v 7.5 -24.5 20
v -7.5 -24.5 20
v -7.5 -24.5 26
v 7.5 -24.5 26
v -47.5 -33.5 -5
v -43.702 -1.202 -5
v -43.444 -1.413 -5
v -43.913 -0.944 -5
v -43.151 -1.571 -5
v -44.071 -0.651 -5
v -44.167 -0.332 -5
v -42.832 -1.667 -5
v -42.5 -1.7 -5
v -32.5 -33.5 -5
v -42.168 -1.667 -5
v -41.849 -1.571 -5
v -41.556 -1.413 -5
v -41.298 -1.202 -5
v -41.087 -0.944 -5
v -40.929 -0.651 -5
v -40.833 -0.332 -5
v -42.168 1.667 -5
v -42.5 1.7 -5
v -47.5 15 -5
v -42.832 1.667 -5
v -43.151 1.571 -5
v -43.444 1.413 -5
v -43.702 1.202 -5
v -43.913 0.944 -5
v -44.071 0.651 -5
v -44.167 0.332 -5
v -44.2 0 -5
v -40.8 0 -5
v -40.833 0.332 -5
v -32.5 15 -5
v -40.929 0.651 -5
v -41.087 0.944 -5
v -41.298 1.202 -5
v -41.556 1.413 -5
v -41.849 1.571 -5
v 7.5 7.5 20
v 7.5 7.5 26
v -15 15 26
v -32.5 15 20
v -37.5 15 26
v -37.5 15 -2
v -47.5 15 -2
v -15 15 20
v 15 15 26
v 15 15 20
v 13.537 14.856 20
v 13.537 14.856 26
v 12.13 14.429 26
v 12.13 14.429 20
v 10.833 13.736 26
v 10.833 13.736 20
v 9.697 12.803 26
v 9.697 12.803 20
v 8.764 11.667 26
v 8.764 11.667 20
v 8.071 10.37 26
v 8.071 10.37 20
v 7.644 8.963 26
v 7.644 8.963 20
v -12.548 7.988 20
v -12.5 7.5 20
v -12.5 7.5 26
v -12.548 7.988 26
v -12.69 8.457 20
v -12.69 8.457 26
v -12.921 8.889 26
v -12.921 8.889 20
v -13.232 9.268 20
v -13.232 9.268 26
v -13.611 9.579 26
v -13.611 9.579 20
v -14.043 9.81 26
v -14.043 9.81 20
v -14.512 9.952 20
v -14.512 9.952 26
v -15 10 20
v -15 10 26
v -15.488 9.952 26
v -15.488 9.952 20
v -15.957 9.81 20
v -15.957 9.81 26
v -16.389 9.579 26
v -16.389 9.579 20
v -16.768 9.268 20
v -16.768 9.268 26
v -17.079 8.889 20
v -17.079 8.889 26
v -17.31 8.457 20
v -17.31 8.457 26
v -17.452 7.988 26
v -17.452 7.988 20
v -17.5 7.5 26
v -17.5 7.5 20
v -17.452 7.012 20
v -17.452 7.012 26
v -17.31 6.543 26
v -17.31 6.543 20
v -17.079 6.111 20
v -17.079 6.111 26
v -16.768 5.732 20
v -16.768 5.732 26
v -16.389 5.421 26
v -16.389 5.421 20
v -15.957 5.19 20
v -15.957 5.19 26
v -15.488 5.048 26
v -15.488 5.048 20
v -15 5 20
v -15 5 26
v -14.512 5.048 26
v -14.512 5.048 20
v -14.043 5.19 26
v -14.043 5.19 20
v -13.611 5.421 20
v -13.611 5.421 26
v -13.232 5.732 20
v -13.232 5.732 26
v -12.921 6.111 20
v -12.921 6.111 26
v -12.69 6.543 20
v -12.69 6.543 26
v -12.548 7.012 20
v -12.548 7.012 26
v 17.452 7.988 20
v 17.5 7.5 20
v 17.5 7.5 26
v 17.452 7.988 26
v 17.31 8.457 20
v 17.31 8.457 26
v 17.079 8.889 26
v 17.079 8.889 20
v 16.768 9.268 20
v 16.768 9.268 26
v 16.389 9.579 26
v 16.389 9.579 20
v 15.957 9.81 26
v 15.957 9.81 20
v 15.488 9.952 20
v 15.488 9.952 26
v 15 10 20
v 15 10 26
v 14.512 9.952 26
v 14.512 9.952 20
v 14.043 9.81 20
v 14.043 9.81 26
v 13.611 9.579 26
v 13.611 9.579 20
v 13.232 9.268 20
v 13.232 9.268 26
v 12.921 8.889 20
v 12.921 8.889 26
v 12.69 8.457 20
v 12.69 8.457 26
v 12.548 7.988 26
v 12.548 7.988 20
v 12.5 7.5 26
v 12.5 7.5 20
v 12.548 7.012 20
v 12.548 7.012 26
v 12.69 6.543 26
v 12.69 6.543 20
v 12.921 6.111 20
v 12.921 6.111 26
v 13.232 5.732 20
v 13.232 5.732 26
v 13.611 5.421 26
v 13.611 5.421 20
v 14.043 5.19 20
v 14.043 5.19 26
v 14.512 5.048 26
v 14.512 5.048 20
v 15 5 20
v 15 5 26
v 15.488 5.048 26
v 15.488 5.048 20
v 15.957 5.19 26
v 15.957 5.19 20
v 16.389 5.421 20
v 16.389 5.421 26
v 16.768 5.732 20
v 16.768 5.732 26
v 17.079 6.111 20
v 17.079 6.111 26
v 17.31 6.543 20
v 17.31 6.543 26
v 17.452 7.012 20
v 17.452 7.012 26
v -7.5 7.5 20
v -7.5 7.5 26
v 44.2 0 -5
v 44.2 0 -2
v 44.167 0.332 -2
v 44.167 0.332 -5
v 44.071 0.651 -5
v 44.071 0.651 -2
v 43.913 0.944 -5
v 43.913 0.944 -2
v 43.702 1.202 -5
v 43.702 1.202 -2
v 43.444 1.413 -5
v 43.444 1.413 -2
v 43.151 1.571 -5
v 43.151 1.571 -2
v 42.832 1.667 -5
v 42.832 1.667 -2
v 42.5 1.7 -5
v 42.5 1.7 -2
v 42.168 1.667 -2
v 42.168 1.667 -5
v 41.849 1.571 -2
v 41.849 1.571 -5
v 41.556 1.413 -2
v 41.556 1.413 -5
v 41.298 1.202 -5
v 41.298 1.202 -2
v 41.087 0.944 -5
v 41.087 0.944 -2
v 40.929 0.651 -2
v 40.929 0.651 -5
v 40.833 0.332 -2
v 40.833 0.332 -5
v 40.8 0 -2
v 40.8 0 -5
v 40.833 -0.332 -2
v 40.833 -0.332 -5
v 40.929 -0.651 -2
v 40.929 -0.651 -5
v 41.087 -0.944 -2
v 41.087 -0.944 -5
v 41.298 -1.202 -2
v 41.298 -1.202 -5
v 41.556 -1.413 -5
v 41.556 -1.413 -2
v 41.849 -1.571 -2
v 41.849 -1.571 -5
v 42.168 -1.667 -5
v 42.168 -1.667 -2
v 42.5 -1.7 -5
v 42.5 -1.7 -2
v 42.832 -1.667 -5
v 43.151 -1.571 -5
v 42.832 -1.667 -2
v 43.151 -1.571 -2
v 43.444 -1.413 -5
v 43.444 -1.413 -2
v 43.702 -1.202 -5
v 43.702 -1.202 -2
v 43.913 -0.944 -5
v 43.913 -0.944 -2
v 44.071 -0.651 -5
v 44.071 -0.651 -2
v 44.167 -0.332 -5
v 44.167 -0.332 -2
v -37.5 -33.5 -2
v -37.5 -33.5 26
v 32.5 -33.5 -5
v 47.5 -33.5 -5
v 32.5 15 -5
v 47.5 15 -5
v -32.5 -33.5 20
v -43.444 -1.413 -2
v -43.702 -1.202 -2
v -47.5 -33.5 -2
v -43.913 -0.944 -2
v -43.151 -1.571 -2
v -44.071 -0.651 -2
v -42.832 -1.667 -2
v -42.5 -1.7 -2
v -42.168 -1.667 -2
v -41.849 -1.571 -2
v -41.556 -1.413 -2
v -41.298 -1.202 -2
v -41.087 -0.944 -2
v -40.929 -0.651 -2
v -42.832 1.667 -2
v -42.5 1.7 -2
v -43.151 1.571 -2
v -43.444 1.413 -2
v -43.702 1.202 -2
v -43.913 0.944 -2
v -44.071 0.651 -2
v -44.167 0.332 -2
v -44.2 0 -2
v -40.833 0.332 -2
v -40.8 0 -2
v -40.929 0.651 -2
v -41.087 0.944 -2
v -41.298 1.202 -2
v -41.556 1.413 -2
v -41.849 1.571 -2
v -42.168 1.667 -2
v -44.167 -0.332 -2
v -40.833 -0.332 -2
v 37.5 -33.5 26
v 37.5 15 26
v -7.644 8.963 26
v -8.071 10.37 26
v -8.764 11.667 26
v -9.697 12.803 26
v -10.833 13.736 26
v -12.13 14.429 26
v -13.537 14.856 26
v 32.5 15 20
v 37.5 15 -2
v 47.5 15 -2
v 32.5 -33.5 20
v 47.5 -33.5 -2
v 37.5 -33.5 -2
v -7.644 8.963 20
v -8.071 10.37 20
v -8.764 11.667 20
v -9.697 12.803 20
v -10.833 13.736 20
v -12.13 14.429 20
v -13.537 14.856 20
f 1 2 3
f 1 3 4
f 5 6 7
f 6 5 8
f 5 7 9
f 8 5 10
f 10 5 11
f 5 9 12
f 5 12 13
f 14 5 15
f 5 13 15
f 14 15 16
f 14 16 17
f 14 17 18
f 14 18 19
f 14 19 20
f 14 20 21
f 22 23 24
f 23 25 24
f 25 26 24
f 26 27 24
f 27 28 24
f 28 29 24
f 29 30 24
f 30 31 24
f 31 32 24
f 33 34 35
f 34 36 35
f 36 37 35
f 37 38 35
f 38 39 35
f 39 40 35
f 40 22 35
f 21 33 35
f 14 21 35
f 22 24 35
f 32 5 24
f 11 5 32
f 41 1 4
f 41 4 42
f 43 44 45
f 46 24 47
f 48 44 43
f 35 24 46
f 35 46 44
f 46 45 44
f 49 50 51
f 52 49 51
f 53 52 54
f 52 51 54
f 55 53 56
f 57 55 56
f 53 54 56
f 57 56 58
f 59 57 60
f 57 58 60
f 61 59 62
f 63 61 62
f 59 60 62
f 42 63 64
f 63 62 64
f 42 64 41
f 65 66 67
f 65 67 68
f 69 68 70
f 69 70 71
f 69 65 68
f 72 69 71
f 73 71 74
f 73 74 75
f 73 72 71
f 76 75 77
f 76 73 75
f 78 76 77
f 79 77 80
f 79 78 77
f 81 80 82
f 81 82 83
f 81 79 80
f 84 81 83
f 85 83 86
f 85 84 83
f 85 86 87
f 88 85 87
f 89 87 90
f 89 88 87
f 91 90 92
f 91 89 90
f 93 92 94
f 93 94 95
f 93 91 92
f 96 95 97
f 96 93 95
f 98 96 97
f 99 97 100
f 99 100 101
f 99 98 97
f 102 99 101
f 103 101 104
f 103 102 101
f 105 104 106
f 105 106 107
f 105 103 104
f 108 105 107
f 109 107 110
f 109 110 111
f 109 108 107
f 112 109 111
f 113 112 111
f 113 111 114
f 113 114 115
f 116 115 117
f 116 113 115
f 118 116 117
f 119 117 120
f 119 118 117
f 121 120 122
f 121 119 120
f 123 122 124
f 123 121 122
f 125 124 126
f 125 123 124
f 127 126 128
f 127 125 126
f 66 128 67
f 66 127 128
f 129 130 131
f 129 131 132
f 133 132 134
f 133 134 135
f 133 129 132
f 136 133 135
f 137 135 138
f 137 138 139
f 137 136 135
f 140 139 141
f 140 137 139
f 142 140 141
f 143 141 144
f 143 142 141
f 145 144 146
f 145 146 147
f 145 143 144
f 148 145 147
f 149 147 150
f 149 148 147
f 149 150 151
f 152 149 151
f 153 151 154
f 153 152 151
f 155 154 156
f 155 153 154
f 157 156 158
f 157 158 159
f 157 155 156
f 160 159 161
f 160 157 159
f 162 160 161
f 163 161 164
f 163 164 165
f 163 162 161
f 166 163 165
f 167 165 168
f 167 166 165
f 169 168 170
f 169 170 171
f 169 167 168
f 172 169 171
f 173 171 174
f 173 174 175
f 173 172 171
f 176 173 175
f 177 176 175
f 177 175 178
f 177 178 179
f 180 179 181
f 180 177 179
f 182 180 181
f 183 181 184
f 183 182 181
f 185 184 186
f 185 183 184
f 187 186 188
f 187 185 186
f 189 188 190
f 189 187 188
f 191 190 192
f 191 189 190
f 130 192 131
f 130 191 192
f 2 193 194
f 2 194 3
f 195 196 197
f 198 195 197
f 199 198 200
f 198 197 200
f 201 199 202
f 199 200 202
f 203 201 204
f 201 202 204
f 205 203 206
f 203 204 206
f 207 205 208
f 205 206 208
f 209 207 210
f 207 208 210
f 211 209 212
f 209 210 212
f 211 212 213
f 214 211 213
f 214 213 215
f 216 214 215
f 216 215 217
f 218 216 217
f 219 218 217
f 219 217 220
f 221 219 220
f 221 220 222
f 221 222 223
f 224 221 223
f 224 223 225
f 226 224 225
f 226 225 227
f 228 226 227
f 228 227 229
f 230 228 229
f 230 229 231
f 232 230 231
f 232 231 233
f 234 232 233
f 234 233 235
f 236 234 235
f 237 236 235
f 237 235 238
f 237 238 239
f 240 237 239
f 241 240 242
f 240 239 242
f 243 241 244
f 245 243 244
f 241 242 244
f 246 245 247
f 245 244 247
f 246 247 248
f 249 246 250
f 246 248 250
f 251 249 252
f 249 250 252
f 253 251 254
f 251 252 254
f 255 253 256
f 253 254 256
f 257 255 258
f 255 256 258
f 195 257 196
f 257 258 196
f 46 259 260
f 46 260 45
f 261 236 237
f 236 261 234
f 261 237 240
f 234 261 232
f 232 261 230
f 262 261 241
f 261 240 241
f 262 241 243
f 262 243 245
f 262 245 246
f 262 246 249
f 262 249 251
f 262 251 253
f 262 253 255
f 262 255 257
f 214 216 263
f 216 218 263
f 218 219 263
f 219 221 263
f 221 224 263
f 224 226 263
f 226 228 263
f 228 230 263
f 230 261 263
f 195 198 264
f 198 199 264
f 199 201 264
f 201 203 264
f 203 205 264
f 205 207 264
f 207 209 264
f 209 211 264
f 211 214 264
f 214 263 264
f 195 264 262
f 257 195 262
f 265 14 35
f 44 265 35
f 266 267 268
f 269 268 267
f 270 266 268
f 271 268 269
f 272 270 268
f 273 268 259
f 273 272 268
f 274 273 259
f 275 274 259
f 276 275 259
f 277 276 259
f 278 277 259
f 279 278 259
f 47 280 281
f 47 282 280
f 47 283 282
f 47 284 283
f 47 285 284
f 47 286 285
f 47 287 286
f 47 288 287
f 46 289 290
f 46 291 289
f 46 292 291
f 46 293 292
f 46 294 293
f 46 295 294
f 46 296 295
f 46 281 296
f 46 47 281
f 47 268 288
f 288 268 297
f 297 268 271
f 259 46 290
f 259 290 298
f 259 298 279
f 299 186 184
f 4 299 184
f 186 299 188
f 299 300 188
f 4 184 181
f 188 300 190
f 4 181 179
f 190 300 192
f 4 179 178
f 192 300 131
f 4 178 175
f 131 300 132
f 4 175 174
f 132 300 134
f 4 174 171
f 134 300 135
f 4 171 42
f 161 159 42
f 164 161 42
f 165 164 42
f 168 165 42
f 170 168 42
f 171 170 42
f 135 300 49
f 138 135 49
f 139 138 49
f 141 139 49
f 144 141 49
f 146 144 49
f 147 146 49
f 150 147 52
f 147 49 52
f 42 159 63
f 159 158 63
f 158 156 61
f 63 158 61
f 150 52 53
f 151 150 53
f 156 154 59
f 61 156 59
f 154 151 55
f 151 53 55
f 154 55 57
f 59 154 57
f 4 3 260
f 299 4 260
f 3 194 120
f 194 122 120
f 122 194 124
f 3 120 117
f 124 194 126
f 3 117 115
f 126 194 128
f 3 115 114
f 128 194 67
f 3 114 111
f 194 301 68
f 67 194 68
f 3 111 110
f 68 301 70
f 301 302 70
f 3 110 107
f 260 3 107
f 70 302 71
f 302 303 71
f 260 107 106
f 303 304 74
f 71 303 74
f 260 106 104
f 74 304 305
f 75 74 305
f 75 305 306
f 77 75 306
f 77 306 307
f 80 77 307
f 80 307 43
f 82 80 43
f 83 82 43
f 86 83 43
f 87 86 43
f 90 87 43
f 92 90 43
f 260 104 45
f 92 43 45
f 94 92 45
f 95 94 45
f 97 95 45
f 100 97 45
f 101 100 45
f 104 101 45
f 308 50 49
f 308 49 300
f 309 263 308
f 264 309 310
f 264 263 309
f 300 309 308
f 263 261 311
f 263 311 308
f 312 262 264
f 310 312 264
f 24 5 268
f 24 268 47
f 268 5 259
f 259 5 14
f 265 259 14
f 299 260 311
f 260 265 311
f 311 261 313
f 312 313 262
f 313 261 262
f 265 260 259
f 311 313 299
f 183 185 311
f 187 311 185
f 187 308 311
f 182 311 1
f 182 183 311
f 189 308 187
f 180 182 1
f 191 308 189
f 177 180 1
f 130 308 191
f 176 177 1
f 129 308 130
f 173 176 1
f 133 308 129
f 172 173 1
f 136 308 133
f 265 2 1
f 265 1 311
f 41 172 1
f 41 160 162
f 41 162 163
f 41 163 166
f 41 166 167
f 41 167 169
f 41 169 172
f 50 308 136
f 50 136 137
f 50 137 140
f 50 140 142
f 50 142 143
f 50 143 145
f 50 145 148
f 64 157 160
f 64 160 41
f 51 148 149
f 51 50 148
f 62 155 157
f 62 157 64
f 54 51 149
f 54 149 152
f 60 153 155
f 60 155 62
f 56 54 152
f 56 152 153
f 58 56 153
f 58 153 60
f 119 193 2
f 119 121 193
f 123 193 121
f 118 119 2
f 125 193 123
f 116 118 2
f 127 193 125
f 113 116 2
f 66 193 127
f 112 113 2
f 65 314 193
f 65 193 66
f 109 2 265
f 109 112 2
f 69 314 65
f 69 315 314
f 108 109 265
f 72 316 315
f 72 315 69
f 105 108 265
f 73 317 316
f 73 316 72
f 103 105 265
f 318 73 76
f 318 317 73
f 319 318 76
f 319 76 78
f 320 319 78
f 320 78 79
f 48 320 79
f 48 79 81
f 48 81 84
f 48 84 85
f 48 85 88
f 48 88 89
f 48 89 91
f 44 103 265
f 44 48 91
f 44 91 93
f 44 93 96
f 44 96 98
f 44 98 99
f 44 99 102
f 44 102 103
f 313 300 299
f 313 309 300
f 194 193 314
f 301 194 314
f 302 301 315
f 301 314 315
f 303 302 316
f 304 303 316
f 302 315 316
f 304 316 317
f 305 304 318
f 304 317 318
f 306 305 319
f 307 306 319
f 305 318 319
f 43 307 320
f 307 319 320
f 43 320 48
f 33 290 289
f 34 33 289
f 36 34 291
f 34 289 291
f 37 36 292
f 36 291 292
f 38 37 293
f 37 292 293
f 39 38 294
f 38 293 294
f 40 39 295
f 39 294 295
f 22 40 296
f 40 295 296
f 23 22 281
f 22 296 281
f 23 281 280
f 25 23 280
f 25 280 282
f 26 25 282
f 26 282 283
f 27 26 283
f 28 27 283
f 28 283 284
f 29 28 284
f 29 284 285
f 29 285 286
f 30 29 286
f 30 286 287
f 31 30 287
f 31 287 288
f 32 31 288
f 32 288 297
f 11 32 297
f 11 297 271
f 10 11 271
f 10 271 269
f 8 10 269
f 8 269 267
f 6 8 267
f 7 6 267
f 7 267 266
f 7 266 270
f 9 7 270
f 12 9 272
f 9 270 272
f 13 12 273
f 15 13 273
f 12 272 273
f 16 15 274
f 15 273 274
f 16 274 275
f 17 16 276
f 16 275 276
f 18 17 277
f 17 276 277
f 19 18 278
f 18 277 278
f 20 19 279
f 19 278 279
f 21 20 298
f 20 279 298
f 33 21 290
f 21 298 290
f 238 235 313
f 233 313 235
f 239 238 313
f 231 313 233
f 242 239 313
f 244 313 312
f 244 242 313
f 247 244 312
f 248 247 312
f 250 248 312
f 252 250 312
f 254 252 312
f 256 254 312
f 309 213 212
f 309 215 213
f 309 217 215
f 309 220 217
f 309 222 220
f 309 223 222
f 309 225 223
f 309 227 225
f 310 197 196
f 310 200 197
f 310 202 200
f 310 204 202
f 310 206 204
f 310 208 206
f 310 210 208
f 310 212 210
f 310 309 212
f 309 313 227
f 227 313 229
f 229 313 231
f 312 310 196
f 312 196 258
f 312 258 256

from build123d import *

# Parameters (mm, degrees)
SKETCH107_R   = 2.5
PAD038_DEPTH  = 6
SKETCH108_W   = 5
SKETCH108_H   = 48.5
PAD039_DEPTH  = 22
SKETCH109_W   = 15
SKETCH109_H   = 48.5
PAD040_DEPTH  = 3
SKETCH110_R   = 1.7
HOLE002_DEPTH = 25


with BuildPart() as part:
    # Sketch107 → Pad038 (new body)
    with BuildSketch(Plane.XY.offset(20)):
        with BuildLine():
            Line((-7.5, 7.5), (-7.5, -24.5))
            Line((-7.5, -24.5), (7.5, -24.5))
            Line((7.5, -24.5), (7.5, 7.5))
            ThreePointArc((15, 15), (9.696699, 12.803301), (7.5, 7.5))
            Line((15, 15), (37.5, 15))
            Line((37.5, 15), (37.5, -33.5))
            Line((0, -33.5), (37.5, -33.5))
            Line((-37.5, -33.5), (0, -33.5))
            Line((-37.5, -33.5), (-37.5, 15))
            Line((-37.5, 15), (-15, 15))
            ThreePointArc((-7.5, 7.5), (-9.696699, 12.803301), (-15, 15))
        make_face()
        with Locations((-15, 7.5)):
            Circle(SKETCH107_R, mode=Mode.SUBTRACT)
        with Locations((15, 7.5)):
            Circle(SKETCH107_R, mode=Mode.SUBTRACT)
    extrude(amount=PAD038_DEPTH)

    # Sketch108 → Pad039 (join)
    with BuildSketch(Plane.XY.offset(-2)):
        with Locations((-35, -9.25)):
            Rectangle(SKETCH108_W, SKETCH108_H)
        with Locations((35, -9.25)):
            Rectangle(SKETCH108_W, SKETCH108_H)
    extrude(amount=PAD039_DEPTH)

    # Sketch109 → Pad040 (join)
    with BuildSketch(Plane.XY.offset(-5)):
        with Locations((-40, -9.25)):
            Rectangle(SKETCH109_W, SKETCH109_H)
        with Locations((40, -9.25)):
            Rectangle(SKETCH109_W, SKETCH109_H)
    extrude(amount=PAD040_DEPTH)

    # Sketch110 → Hole002 (cut)
    with BuildSketch(Plane.XY.offset(3)):
        with Locations((-42.5, 0)):
            Circle(SKETCH110_R)
        with Locations((42.5, 0)):
            Circle(SKETCH110_R)
    extrude(amount=-HOLE002_DEPTH, mode=Mode.SUBTRACT)


solid = part.part
